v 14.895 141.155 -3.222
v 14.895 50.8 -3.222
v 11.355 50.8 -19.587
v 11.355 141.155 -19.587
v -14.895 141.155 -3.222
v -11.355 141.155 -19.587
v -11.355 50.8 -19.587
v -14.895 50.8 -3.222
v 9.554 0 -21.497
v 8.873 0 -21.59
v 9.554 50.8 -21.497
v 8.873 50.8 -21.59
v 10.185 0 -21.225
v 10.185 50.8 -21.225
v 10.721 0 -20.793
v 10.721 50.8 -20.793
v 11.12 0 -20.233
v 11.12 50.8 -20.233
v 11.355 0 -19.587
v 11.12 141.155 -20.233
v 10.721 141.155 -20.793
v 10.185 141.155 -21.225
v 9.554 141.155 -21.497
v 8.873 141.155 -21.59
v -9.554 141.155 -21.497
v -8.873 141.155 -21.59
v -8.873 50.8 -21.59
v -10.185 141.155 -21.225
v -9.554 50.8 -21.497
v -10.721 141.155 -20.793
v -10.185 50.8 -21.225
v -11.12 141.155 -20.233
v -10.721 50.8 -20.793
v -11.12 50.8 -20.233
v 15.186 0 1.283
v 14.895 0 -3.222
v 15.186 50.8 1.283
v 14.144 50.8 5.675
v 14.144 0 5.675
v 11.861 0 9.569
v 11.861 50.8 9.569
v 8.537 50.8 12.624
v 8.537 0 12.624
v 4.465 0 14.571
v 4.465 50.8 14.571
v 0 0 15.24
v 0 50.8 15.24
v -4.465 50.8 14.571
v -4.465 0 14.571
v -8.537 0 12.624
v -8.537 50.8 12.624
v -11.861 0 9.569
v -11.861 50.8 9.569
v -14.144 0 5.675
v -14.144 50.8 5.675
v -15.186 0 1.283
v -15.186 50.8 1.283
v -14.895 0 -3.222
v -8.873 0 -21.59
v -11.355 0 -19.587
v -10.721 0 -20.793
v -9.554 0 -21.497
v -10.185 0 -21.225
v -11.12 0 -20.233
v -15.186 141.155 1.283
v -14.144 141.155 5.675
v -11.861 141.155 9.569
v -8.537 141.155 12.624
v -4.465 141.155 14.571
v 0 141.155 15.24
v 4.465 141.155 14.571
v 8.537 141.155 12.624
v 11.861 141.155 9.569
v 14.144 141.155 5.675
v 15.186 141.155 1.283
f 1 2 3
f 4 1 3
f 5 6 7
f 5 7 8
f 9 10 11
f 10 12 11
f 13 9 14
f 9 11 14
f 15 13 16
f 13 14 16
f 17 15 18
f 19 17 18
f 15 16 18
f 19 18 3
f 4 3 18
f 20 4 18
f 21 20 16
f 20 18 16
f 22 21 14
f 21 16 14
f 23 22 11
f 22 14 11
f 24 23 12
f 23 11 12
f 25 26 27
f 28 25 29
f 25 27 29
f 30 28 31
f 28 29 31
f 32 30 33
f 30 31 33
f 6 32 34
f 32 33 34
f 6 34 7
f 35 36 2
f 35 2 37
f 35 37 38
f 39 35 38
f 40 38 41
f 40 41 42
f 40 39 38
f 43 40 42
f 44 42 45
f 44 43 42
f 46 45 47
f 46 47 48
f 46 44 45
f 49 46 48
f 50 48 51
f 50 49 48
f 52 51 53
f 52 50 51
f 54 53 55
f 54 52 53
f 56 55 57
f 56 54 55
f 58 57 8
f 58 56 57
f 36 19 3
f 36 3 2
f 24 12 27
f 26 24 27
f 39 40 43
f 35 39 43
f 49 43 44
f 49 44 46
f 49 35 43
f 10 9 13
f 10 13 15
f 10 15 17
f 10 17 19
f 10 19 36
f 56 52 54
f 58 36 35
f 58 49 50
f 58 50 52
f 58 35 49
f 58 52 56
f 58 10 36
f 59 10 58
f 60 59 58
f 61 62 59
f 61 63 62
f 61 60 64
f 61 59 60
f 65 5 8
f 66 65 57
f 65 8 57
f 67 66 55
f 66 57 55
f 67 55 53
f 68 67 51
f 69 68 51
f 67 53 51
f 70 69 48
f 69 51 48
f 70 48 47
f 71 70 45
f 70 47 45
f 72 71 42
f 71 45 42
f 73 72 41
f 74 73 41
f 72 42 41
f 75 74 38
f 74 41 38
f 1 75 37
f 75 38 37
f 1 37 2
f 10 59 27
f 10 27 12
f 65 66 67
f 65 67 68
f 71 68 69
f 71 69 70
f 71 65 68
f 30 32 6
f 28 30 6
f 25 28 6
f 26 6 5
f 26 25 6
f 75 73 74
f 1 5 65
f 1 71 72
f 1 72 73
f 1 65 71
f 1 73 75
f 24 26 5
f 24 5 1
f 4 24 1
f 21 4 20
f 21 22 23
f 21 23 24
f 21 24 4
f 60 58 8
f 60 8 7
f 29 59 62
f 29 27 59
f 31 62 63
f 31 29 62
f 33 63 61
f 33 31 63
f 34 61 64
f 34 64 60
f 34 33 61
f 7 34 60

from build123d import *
from build123d.topology import SkipClean

# Parameters (mm, degrees)
EXTRUDE1_DEPTH = 50.8
FILLET1_R      = 2.54
EXTRUDE2_DEPTH = 90.354547646


with BuildPart() as part:
    # Sketch5 → Extrude1 (new body)
    with BuildSketch(Plane(origin=(0, 0, 0), x_dir=(1, 0, 0), z_dir=(0, 1, 0))):
        with BuildLine():
            Line((-10.922, 21.59), (10.922, 21.59))
            Line((10.922, 21.59), (14.895447762, 3.222302897))
            ThreePointArc((14.895447762, 3.222302897), (0, -15.24), (-14.895447762, 3.222302897))
            Line((-14.895447762, 3.222302897), (-10.922, 21.59))
        make_face()
    extrude(amount=EXTRUDE1_DEPTH)

    # Fillet1
    fillet1_edges = [part.edges().sort_by_distance(p)[0] for p in [
        (-10.922, 25.4, -21.59),
        (10.922, 25.4, -21.59),
    ]]
    fillet(fillet1_edges, radius=FILLET1_R)

    # Sketch10 → Extrude2 (add)
    with SkipClean():  # the faces are left unmerged after this step: merging them gives an invalid solid
        with BuildSketch(Plane(origin=(0, 50.8, 0), x_dir=(1, 0, 0), z_dir=(0, 1, 0))):
            with BuildLine():
                Line((8.8727195, 21.59), (-8.8727195, 21.59))
                ThreePointArc((-8.8727195, 21.59), (-10.467632001, 21.026829308), (-11.355294127, 19.587050483))
                Line((-11.355294127, 19.587050483), (-14.895447762, 3.222302897))
                ThreePointArc((-14.895447762, 3.222302897), (0, -15.24), (14.895447762, 3.222302897))
                Line((14.895447762, 3.222302897), (11.355294127, 19.587050483))
                ThreePointArc((11.355294127, 19.587050483), (10.467632001, 21.026829308), (8.8727195, 21.59))
            make_face()
        extrude(amount=EXTRUDE2_DEPTH)


solid = part.part
